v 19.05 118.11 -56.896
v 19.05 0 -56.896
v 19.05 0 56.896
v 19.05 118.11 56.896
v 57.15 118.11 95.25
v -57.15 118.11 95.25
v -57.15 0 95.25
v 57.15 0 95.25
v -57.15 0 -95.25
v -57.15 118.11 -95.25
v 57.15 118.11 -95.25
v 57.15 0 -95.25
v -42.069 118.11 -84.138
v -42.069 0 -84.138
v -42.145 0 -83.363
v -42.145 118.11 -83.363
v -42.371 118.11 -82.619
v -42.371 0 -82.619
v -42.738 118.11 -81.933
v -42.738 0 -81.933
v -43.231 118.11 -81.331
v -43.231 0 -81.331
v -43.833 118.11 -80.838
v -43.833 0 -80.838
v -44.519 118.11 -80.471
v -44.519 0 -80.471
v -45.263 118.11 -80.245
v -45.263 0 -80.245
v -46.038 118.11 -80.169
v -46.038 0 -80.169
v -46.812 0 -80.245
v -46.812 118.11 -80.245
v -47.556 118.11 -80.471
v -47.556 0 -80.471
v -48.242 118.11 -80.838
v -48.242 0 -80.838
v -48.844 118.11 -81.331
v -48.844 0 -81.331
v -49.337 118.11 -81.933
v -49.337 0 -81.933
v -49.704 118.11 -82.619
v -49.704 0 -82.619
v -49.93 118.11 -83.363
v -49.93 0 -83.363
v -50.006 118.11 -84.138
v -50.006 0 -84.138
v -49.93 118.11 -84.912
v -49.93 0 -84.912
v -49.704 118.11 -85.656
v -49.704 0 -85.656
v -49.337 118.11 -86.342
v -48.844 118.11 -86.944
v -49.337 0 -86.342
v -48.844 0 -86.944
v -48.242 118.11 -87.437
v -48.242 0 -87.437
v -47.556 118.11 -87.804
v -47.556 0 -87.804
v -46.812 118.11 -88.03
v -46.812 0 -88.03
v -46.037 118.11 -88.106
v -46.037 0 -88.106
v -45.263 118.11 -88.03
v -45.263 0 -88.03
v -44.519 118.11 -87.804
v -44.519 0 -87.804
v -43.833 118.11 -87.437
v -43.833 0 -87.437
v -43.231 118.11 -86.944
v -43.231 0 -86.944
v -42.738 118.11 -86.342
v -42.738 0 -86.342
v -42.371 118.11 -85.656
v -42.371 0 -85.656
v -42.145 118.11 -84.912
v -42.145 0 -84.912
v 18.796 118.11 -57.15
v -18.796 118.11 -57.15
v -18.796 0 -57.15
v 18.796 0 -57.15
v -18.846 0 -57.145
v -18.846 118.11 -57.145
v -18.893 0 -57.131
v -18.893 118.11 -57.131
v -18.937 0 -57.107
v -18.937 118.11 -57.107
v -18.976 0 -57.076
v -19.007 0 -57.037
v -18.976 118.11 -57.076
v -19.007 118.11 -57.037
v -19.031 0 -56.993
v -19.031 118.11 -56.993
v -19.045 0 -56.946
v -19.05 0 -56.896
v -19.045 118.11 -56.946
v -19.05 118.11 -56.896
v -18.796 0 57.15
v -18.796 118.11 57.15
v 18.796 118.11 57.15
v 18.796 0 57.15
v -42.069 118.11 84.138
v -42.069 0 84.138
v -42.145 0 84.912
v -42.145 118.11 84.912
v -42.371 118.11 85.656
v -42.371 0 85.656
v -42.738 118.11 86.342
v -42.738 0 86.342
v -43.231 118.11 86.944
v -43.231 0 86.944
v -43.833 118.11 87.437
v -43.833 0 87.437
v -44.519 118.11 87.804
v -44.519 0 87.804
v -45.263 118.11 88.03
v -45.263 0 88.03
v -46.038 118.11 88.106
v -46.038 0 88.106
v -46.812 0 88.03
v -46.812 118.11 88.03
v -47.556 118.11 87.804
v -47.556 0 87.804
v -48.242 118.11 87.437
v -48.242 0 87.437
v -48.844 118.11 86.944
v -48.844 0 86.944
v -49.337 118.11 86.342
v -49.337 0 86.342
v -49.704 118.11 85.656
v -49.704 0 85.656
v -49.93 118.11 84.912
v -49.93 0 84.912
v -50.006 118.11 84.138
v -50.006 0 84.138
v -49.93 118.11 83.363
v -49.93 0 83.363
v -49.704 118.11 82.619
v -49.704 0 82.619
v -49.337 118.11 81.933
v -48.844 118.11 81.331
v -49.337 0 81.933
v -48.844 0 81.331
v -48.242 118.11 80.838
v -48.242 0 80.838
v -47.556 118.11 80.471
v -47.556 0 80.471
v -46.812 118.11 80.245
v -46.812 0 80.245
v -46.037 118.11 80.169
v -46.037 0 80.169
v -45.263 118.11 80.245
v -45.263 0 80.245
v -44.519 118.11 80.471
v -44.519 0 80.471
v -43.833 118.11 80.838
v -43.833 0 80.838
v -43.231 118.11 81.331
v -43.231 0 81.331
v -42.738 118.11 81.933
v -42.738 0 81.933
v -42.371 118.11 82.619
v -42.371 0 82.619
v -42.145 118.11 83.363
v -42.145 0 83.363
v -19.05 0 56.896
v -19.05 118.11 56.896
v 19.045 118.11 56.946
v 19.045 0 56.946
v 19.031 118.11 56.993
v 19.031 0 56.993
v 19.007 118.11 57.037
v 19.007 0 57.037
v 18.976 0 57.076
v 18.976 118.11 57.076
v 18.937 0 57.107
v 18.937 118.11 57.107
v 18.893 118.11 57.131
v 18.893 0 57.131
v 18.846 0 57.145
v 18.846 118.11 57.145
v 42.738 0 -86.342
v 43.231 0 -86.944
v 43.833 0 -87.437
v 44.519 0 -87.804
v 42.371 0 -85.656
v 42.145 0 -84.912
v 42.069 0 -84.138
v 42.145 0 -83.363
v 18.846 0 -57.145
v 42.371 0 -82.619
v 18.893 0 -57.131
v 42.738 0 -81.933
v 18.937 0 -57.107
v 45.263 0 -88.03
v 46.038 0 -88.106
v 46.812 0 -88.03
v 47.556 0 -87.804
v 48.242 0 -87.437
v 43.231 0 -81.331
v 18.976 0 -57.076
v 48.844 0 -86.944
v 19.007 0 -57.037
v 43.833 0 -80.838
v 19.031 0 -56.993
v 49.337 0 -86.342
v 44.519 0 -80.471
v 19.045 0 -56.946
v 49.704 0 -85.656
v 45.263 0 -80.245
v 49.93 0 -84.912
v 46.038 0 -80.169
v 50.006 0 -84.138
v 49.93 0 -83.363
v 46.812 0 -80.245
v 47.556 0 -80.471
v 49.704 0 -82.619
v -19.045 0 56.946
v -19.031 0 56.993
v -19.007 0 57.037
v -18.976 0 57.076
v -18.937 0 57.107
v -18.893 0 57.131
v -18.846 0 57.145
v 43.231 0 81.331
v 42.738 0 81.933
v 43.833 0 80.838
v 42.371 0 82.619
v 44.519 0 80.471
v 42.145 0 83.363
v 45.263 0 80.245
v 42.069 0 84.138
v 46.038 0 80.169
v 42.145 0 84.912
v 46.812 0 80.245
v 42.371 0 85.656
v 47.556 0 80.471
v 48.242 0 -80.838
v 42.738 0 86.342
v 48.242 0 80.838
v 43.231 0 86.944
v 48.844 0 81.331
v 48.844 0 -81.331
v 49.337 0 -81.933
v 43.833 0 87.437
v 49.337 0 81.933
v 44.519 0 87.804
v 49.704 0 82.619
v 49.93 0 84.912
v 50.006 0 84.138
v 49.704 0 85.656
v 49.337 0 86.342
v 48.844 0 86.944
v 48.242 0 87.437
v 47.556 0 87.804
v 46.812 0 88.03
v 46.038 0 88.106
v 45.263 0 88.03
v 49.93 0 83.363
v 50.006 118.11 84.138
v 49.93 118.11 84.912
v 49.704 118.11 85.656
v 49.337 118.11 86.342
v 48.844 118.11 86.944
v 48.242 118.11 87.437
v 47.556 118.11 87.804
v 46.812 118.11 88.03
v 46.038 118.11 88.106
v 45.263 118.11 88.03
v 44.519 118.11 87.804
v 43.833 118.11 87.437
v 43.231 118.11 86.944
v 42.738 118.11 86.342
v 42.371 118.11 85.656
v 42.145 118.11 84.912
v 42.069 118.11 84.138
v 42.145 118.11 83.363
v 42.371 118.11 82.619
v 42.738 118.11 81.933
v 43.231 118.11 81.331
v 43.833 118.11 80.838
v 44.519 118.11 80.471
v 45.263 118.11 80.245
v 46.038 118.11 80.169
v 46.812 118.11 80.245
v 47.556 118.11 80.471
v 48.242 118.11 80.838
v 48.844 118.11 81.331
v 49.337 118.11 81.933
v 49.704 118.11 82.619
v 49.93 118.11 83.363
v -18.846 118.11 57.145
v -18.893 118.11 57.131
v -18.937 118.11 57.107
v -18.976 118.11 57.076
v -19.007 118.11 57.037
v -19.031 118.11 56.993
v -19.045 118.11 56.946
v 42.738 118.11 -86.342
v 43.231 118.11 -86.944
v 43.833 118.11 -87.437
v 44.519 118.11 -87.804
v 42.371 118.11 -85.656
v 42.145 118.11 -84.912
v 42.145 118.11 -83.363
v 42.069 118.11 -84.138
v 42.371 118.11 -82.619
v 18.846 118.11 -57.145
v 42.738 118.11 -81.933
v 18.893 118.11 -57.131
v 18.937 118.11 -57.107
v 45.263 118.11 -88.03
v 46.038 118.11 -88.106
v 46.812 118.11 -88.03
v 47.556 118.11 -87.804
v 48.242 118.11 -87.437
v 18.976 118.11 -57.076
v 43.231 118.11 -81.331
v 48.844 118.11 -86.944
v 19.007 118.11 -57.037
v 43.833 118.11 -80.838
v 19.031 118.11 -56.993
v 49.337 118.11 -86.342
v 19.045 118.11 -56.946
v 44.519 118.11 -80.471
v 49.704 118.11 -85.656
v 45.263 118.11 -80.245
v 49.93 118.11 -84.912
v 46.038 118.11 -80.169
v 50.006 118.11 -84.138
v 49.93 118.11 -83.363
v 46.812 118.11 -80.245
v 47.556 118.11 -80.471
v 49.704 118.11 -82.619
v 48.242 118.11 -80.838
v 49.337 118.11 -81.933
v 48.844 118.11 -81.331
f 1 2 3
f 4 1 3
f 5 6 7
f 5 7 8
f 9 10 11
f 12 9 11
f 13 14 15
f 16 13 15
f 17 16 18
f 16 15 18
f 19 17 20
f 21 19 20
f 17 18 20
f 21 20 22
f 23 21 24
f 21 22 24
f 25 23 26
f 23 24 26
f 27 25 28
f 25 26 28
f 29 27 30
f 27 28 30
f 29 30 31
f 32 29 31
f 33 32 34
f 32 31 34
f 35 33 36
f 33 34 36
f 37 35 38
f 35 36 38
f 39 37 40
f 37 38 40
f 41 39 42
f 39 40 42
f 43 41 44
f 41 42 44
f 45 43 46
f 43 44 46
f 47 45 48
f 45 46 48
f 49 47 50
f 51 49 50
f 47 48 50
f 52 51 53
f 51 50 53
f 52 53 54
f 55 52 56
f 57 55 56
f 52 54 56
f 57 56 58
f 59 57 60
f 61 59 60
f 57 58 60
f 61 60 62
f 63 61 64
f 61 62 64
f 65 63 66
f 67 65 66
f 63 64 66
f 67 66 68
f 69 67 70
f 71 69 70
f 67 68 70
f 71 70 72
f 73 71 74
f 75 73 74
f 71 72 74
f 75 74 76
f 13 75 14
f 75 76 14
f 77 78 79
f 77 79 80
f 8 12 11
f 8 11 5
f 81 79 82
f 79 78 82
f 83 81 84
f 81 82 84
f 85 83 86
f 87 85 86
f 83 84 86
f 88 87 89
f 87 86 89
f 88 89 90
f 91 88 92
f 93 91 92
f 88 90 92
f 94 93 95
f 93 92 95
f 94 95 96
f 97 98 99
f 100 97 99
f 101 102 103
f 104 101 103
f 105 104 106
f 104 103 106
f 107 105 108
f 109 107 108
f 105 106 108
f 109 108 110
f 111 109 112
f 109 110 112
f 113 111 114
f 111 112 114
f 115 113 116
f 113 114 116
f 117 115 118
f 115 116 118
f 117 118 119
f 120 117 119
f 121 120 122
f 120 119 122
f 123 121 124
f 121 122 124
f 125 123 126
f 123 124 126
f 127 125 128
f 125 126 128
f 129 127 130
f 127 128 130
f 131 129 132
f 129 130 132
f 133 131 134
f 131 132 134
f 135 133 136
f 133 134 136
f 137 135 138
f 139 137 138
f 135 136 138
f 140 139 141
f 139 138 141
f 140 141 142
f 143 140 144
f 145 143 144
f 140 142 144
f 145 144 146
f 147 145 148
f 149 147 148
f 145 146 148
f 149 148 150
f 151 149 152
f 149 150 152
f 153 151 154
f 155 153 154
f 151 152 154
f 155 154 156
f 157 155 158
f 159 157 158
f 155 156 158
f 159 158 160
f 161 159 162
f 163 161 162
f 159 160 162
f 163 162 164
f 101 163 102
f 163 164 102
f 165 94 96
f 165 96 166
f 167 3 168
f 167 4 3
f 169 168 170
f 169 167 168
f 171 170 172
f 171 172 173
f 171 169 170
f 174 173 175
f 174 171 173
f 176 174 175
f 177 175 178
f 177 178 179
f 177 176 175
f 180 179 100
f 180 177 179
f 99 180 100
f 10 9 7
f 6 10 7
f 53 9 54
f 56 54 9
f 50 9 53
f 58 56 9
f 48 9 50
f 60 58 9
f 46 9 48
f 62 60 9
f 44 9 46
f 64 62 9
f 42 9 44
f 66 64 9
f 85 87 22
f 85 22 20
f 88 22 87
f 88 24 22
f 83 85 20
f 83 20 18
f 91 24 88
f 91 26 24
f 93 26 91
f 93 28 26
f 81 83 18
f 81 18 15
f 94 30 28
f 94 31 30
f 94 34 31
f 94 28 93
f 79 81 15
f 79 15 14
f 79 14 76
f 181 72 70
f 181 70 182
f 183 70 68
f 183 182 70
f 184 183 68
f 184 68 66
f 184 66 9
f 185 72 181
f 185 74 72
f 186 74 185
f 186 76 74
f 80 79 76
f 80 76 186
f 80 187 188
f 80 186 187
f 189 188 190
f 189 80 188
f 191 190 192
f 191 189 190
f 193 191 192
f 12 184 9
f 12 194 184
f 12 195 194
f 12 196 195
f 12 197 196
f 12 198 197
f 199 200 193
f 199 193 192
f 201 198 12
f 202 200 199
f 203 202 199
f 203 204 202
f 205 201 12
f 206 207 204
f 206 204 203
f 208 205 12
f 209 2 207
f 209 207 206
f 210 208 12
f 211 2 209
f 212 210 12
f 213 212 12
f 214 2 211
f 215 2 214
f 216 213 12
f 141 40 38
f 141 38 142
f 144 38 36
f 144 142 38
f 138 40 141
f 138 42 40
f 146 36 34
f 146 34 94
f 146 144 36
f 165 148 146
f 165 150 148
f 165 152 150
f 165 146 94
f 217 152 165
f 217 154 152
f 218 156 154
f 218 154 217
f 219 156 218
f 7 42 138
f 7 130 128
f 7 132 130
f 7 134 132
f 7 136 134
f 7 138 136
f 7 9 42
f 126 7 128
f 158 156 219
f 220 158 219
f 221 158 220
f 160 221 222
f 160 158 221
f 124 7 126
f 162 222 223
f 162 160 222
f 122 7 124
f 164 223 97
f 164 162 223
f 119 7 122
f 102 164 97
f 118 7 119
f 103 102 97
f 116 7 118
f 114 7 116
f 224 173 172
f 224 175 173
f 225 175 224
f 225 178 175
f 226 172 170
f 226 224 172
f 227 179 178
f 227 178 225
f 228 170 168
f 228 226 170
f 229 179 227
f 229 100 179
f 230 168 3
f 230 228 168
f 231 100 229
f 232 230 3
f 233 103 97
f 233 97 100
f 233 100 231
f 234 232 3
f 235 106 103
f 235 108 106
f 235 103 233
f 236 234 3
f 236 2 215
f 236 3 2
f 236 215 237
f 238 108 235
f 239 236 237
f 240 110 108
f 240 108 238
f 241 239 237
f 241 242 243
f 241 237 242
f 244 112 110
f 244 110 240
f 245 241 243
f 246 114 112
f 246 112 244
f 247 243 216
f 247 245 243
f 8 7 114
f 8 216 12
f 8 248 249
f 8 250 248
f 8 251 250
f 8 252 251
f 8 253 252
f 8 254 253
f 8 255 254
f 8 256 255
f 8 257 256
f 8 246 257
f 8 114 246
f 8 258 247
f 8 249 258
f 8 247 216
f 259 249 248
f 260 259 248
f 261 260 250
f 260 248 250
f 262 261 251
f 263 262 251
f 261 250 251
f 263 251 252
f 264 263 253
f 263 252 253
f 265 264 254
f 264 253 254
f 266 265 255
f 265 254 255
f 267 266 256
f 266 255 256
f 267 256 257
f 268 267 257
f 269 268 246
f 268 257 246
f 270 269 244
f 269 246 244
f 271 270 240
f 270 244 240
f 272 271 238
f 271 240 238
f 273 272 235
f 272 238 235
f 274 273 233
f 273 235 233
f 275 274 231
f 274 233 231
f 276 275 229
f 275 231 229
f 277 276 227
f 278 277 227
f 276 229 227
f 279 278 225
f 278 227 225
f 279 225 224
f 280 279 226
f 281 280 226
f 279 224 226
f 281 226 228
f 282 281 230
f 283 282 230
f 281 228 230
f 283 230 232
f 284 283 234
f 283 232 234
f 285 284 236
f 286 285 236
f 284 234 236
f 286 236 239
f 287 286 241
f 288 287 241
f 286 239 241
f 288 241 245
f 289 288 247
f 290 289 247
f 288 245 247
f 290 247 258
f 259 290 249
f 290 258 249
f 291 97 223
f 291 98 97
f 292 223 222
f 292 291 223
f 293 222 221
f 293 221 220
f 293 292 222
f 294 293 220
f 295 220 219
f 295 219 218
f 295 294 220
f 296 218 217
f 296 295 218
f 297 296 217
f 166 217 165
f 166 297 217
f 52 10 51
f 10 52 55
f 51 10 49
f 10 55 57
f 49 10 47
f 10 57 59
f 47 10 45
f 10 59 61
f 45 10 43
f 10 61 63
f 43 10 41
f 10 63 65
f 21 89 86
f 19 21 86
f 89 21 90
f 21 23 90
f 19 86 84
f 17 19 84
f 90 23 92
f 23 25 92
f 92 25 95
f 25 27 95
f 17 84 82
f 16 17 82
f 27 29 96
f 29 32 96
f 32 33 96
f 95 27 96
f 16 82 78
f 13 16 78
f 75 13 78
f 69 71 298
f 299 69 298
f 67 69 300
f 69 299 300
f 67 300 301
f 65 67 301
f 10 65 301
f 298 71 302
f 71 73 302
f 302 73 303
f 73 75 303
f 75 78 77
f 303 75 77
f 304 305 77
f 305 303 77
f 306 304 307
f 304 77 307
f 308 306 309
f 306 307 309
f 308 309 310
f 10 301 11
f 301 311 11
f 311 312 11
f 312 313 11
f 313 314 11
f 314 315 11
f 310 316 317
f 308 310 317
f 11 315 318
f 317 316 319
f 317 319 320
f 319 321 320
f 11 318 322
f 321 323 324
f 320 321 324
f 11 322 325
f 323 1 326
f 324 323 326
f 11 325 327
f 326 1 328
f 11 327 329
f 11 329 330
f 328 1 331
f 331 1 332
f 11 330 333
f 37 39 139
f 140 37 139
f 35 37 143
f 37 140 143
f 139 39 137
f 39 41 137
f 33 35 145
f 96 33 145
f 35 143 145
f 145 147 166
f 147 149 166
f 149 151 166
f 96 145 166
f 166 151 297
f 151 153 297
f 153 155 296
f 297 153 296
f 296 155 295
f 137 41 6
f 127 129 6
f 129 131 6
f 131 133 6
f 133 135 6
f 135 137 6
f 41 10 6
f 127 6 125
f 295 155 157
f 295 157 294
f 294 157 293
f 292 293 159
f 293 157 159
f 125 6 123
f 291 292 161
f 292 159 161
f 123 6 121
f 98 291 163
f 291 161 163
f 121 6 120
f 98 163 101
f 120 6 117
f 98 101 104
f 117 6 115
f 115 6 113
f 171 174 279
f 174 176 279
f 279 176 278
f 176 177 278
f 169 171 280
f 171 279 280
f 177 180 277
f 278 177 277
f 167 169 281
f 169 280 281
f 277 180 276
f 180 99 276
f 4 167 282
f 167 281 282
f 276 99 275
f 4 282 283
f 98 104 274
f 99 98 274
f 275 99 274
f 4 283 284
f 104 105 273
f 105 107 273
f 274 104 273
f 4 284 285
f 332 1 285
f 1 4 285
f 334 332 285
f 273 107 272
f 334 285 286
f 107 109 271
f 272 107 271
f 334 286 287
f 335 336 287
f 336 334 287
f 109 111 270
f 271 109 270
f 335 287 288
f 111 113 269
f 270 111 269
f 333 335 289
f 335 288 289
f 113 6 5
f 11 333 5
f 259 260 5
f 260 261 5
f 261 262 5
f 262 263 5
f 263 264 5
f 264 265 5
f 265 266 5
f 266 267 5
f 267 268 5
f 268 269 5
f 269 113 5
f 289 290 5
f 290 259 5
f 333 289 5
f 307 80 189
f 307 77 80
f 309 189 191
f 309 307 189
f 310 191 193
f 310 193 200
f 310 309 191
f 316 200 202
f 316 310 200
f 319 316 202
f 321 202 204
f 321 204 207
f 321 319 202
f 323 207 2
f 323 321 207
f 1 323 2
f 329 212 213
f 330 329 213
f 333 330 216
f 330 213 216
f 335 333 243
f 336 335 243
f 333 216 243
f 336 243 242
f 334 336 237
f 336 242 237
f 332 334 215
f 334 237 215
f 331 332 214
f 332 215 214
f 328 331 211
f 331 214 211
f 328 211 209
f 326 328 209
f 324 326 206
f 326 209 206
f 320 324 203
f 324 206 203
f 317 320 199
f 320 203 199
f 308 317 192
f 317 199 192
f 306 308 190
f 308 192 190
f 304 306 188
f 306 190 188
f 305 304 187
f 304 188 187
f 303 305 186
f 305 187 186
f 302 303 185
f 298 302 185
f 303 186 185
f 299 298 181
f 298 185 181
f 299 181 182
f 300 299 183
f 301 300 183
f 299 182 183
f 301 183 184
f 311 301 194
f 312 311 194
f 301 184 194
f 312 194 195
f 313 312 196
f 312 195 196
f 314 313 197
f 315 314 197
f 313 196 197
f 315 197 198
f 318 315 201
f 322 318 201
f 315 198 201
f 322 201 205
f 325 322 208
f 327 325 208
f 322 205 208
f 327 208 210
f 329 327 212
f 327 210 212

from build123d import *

# Parameters (mm, degrees)
F1_W     = 114.3
F1_H     = 190.5
F2_DEPTH = 118.11
F3_R     = 3.96875
F4_DEPTH = 118.11
F5_W     = 38.1
F5_H     = 114.3
F6_DEPTH = 118.11
F7_R     = 0.254


with BuildPart() as f2:
    # F1 (on Front) → F2 (new body)
    with BuildSketch(Plane.XZ):
        Rectangle(F1_W, F1_H)
    extrude(amount=-F2_DEPTH)

    # F3 (on face) → F4 (cut)
    with BuildSketch(Plane.XZ):
        with Locations((-46.0375, 84.1375)):
            Circle(F3_R)
        with Locations((46.0375, 84.1375)):
            Circle(F3_R)
        with Locations((-46.0375, -84.1375)):
            Circle(F3_R)
        with Locations((46.0375, -84.1375)):
            Circle(F3_R)
    extrude(amount=-F4_DEPTH, mode=Mode.SUBTRACT)

    # F5 (on face) → F6 (cut)
    with BuildSketch(Plane.XZ):
        Rectangle(F5_W, F5_H)
    extrude(amount=-F6_DEPTH, mode=Mode.SUBTRACT)

    # F7
    f7_edges = [f2.edges().sort_by_distance(p)[0] for p in [
        (-19.05, 59.055, 57.15),
        (19.05, 59.055, 57.15),
        (19.05, 59.055, -57.15),
        (-19.05, 59.055, -57.15),
    ]]
    fillet(f7_edges, radius=F7_R)


solid = f2.part
